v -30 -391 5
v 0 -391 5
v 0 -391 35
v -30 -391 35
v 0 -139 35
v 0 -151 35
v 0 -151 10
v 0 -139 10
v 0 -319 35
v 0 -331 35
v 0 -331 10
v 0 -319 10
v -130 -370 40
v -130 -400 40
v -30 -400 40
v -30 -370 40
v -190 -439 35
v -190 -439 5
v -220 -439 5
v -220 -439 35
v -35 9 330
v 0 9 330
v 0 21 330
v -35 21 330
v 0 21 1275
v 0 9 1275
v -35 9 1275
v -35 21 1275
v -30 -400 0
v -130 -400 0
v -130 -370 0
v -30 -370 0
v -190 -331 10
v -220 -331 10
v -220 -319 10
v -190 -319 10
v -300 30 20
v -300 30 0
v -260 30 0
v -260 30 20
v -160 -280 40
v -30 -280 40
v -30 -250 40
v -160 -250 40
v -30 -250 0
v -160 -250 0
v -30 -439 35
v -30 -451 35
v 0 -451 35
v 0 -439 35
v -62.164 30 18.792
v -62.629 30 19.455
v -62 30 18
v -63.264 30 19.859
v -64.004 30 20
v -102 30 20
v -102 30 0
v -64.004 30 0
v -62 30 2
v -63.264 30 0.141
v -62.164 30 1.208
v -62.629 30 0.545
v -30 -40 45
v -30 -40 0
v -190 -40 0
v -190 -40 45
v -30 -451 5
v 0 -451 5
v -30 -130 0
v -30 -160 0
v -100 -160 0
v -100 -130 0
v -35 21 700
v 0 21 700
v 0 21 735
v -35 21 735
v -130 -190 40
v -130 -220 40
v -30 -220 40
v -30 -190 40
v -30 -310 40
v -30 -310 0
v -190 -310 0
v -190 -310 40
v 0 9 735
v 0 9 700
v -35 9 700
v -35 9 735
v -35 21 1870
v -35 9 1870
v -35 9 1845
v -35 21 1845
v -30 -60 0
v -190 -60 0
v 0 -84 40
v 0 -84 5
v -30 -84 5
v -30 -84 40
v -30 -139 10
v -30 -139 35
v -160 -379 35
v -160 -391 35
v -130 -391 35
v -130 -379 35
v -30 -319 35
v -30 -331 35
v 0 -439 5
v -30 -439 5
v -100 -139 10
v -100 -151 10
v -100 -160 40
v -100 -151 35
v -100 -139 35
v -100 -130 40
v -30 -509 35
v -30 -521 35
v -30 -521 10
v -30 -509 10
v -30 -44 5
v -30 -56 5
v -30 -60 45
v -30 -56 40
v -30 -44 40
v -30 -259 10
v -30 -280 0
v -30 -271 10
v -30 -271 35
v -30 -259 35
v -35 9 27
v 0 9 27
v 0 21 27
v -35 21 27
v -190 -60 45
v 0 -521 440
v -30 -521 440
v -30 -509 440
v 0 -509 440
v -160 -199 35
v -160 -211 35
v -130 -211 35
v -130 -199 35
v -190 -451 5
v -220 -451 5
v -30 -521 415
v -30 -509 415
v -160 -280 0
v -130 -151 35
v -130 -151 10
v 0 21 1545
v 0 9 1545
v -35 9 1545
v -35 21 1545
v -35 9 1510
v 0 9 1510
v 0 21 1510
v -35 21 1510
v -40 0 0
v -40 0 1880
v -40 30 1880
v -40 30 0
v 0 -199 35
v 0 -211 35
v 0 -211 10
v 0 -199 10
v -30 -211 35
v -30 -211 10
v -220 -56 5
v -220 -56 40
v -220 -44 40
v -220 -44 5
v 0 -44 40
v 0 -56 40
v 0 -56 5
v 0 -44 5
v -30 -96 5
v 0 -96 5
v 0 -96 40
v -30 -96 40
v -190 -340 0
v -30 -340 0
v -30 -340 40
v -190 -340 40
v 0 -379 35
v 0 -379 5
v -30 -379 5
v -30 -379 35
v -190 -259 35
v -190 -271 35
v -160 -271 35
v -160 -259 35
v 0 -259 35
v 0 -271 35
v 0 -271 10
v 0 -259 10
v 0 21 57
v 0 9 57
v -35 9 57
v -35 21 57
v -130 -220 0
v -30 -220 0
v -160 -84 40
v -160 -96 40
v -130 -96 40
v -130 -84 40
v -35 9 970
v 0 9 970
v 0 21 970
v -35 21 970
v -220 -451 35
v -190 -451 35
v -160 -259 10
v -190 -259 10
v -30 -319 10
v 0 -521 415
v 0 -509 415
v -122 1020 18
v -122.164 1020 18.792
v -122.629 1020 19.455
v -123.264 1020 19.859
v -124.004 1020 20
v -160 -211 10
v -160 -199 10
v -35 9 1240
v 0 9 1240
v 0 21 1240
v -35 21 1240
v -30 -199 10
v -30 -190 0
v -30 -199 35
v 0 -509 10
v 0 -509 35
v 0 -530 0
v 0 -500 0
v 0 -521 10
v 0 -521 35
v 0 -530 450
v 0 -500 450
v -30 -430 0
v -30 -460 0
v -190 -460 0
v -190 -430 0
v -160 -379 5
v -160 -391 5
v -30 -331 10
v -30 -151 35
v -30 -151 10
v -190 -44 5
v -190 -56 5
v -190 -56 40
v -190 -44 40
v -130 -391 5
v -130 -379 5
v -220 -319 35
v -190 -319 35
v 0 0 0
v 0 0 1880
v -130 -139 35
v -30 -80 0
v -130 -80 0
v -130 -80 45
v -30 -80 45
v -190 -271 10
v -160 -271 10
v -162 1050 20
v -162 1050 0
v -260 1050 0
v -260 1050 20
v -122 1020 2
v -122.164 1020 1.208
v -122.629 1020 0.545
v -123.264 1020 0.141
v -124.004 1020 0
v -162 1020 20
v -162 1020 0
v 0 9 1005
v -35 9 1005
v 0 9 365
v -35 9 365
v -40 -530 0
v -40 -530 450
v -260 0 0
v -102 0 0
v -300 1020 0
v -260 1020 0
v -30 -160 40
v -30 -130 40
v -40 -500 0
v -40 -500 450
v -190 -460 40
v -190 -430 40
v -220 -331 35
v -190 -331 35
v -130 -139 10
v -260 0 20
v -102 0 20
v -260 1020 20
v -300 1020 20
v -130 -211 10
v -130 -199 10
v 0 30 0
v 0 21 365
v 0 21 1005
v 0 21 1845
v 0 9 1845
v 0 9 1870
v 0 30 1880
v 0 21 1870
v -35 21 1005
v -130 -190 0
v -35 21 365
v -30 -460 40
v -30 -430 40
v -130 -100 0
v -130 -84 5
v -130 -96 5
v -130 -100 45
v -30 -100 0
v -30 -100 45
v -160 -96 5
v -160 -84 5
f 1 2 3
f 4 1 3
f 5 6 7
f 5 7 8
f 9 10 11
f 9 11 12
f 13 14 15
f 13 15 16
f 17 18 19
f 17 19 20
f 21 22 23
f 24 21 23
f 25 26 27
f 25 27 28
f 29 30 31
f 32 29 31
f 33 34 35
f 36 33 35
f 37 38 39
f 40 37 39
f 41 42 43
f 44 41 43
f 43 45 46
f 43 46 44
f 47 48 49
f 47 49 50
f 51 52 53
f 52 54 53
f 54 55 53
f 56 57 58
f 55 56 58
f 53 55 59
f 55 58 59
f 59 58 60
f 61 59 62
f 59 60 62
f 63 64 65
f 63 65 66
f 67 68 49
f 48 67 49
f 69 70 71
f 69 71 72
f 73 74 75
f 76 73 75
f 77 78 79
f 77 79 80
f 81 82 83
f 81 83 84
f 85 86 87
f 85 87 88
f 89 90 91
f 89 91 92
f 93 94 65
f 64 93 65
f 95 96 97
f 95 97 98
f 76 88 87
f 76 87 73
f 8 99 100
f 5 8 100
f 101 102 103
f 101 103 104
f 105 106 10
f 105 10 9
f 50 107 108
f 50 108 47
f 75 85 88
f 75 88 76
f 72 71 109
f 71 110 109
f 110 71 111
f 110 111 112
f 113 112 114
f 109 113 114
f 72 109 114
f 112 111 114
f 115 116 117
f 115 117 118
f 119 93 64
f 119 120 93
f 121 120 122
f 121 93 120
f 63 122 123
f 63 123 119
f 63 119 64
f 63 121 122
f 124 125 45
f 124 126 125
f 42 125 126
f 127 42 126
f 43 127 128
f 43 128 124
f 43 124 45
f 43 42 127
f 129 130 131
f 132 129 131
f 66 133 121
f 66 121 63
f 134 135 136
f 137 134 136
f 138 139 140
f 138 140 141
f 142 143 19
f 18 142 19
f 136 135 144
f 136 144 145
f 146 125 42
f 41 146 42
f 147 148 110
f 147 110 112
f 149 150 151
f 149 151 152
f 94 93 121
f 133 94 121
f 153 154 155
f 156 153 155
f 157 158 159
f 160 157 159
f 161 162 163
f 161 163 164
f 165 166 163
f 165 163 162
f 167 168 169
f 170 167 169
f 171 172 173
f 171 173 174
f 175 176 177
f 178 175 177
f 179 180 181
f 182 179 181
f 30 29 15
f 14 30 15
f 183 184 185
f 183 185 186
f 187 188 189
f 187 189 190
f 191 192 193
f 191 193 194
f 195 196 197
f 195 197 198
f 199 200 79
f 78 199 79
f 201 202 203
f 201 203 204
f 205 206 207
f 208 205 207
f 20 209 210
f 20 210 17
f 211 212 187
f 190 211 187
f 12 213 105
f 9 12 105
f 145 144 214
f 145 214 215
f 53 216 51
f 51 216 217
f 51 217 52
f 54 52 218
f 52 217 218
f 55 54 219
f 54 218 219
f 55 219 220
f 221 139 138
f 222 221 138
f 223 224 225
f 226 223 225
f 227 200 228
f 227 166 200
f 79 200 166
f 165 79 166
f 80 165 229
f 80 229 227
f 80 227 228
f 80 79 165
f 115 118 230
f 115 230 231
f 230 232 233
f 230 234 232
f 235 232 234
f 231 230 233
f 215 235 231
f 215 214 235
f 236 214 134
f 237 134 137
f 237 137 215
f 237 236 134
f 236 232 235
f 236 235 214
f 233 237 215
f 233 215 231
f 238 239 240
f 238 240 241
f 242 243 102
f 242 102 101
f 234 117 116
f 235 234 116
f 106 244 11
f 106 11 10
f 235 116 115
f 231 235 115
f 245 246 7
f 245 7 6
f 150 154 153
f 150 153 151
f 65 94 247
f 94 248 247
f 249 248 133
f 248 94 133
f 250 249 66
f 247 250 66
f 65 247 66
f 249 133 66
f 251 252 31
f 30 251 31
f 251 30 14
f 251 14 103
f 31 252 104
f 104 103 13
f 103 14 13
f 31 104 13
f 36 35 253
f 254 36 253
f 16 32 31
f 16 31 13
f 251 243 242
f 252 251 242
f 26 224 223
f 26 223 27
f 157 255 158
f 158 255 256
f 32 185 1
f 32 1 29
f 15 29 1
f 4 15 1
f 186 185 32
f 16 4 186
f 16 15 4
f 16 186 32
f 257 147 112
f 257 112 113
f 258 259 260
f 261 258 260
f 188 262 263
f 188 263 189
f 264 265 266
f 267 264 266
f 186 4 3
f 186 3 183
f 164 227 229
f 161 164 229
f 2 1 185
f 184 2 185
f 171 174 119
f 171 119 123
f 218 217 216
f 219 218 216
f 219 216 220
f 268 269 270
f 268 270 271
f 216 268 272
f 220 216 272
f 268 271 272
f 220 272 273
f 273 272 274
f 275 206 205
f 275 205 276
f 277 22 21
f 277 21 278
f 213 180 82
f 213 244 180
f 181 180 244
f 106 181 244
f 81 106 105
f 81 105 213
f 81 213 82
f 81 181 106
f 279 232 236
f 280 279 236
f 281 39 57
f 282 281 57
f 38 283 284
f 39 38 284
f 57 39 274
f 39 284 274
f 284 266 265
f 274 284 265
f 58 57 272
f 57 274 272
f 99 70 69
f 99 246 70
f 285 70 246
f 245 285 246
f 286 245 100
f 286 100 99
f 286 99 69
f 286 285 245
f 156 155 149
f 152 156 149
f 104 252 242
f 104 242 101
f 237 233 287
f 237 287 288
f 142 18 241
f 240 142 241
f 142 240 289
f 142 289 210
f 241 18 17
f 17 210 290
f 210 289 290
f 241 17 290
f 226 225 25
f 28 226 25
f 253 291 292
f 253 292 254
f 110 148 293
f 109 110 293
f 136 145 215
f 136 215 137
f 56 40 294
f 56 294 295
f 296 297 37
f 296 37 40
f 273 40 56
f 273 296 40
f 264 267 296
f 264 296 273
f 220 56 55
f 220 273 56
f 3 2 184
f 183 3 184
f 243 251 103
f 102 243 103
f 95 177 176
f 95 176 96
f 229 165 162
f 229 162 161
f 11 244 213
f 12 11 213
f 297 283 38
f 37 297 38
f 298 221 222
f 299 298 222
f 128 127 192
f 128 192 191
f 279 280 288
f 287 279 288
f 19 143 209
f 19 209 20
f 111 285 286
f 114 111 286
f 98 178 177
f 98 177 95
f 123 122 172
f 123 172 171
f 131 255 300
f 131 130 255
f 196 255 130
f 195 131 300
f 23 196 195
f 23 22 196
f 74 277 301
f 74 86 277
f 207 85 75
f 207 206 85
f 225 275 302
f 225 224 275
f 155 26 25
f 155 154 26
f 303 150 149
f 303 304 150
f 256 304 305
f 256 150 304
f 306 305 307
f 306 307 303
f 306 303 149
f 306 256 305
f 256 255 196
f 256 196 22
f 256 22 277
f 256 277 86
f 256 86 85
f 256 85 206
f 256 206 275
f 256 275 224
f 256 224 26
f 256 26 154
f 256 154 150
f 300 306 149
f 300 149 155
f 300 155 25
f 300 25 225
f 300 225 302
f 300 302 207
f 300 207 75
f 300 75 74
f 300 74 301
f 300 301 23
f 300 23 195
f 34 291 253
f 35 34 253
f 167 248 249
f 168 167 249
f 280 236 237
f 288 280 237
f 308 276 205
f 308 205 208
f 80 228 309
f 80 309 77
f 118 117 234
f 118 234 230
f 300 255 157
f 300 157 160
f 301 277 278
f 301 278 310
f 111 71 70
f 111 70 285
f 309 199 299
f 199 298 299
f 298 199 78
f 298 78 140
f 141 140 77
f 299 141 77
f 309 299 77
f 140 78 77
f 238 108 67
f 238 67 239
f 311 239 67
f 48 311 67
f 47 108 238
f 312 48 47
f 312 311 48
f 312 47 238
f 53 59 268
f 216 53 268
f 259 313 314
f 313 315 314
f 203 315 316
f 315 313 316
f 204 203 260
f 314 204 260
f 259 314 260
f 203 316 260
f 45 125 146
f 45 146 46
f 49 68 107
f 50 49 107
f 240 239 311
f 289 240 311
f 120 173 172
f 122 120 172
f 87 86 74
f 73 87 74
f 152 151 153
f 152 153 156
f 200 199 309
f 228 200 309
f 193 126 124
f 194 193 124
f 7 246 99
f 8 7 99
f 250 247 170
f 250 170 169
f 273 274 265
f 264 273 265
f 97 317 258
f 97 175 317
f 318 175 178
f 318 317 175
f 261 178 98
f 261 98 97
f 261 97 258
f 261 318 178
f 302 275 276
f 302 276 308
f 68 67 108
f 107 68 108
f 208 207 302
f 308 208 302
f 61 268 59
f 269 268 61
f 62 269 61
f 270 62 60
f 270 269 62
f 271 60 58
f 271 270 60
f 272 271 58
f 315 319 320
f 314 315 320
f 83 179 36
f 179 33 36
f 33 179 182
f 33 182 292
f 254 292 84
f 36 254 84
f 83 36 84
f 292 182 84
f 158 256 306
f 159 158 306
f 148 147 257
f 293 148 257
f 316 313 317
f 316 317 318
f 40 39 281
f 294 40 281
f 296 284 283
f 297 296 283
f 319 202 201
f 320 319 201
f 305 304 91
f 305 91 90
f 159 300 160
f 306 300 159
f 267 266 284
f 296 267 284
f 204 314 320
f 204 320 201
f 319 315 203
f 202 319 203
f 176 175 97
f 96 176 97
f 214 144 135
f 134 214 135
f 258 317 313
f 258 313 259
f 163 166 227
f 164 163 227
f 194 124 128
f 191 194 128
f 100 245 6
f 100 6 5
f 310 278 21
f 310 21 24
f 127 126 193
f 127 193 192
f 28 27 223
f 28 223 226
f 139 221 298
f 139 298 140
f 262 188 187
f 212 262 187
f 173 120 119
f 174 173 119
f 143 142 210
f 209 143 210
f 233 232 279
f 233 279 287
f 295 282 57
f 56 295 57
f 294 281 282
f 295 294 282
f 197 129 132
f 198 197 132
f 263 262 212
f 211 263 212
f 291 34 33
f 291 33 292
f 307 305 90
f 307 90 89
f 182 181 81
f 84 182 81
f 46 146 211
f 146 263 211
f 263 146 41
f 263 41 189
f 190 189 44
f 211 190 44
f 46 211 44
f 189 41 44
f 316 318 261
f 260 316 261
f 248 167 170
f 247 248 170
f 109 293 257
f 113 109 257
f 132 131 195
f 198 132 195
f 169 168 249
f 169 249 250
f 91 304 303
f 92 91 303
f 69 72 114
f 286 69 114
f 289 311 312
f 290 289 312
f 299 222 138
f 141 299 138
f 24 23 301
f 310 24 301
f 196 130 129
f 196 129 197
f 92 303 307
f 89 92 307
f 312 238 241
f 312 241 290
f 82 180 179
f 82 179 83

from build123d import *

# Parameters (mm, degrees)
F1_W      = 12
F1_H      = 35
F2_DEPTH  = 220
F3_START  = -30
F1_W_2    = 20
F1_H_2    = 45
F3_DEPTH  = 160
F4_DEPTH  = 160
F5_START  = -30
F5_DEPTH  = 100
F7_DEPTH  = 20
F8_R      = 2
F0_W      = 30
F0_H      = 1880
F0_W_2    = 12
F0_H_2    = 30
F0_H_3    = 35
F0_H_4    = 25
F9_DEPTH  = 40
F10_DEPTH = 35
F11_W     = 12
F11_H     = 25
F12_DEPTH = 130
F13_START = -30
F11_W_2   = 30
F11_H_2   = 40
F13_DEPTH = 70
F14_DEPTH = 160
F15_START = -30
F15_DEPTH = 100
F16_DEPTH = 190
F17_START = -30
F17_DEPTH = 130
F18_DEPTH = 220
F19_START = -30
F19_DEPTH = 160
F11_H_3   = 30
F20_DEPTH = 160
F21_START = -30
F21_DEPTH = 100
F22_DEPTH = 220
F23_START = -30
F23_DEPTH = 160
F24_W     = 30
F24_H     = 450
F24_W_2   = 12
F24_H_2   = 25
F25_DEPTH = 40
F26_DEPTH = 30


with BuildPart() as f2:
    # F1 (on Right) → F2 (new body)
    with BuildSketch(Plane.YZ):
        with Locations((-50, 22.5)):
            Rectangle(F1_W, F1_H)
    extrude(amount=-F2_DEPTH)

    # F1 (on Right) → F3 (join)
    with BuildSketch(Plane.YZ.offset(F3_START)):
        with Locations((-50, 22.5)):
            Rectangle(F1_W_2, F1_H_2)
        with Locations((-50, 22.5)):
            Rectangle(F1_W, F1_H, mode=Mode.SUBTRACT)
    extrude(amount=-F3_DEPTH)


with BuildPart() as f4:
    # F1 (on Right) → F4 (new body)
    with BuildSketch(Plane.YZ):
        with Locations((-90, 22.5)):
            Rectangle(F1_W, F1_H)
    extrude(amount=-F4_DEPTH)

    # F1 (on Right) → F5 (join)
    with BuildSketch(Plane.YZ.offset(F5_START)):
        with Locations((-90, 22.5)):
            Rectangle(F1_W_2, F1_H_2)
        with Locations((-90, 22.5)):
            Rectangle(F1_W, F1_H, mode=Mode.SUBTRACT)
    extrude(amount=-F5_DEPTH)


with BuildPart() as f7:
    # F6 (on Top) → F7 (new body)
    with BuildSketch(Plane.XY):
        Polygon((-260, 0), (-102, 0), (-102, 30), (-62, 30), (-122, 1020), (-162, 1020), (-162, 1050), (-260, 1050), (-260, 1020), (-300, 1020), (-300, 30), (-260, 30), align=None)
    extrude(amount=F7_DEPTH)

    # F8
    f8_edges = [f7.edges().sort_by_distance(p)[0] for p in [
        (-92, 525, 20),
        (-92, 525, 0),
    ]]
    fillet(f8_edges, radius=F8_R)


with BuildPart() as f9:
    # F0 (on Right) → F9 (new body)
    with BuildSketch(Plane.YZ):
        with Locations((15, 940)):
            Rectangle(F0_W, F0_H)
        with Locations((15, 42)):
            Rectangle(F0_W_2, F0_H_2, mode=Mode.SUBTRACT)
        with Locations((15, 347.5)):
            Rectangle(F0_W_2, F0_H_3, mode=Mode.SUBTRACT)
        with Locations((15, 717.5)):
            Rectangle(F0_W_2, F0_H_3, mode=Mode.SUBTRACT)
        with Locations((15, 987.5)):
            Rectangle(F0_W_2, F0_H_3, mode=Mode.SUBTRACT)
        with Locations((15, 1257.5)):
            Rectangle(F0_W_2, F0_H_3, mode=Mode.SUBTRACT)
        with Locations((15, 1527.5)):
            Rectangle(F0_W_2, F0_H_3, mode=Mode.SUBTRACT)
        with Locations((15, 1857.5)):
            Rectangle(F0_W_2, F0_H_4, mode=Mode.SUBTRACT)
        with Locations((15, 1527.5)):
            Rectangle(F0_W_2, F0_H_3)
        with Locations((15, 1257.5)):
            Rectangle(F0_W_2, F0_H_3)
        with Locations((15, 987.5)):
            Rectangle(F0_W_2, F0_H_3)
        with Locations((15, 717.5)):
            Rectangle(F0_W_2, F0_H_3)
        with Locations((15, 347.5)):
            Rectangle(F0_W_2, F0_H_3)
        with Locations((15, 42)):
            Rectangle(F0_W_2, F0_H_2)
        with Locations((15, 1857.5)):
            Rectangle(F0_W_2, F0_H_4)
    extrude(amount=-F9_DEPTH)

    # F0 (on Right) → F10 (cut)
    with BuildSketch(Plane.YZ):
        with Locations((15, 42)):
            Rectangle(F0_W_2, F0_H_2)
        with Locations((15, 347.5)):
            Rectangle(F0_W_2, F0_H_3)
        with Locations((15, 717.5)):
            Rectangle(F0_W_2, F0_H_3)
        with Locations((15, 987.5)):
            Rectangle(F0_W_2, F0_H_3)
        with Locations((15, 1257.5)):
            Rectangle(F0_W_2, F0_H_3)
        with Locations((15, 1527.5)):
            Rectangle(F0_W_2, F0_H_3)
        with Locations((15, 1857.5)):
            Rectangle(F0_W_2, F0_H_4)
    extrude(amount=-F10_DEPTH, mode=Mode.SUBTRACT)


with BuildPart() as f12:
    # F11 (on Right) → F12 (new body)
    with BuildSketch(Plane.YZ):
        with Locations((-145, 22.5)):
            Rectangle(F11_W, F11_H)
    extrude(amount=-F12_DEPTH)

    # F11 (on Right) → F13 (join)
    with BuildSketch(Plane.YZ.offset(F13_START)):
        with Locations((-145, 20)):
            Rectangle(F11_W_2, F11_H_2)
        with Locations((-145, 22.5)):
            Rectangle(F11_W, F11_H, mode=Mode.SUBTRACT)
    extrude(amount=-F13_DEPTH)


with BuildPart() as f14:
    # F11 (on Right) → F14 (new body)
    with BuildSketch(Plane.YZ):
        with Locations((-205, 22.5)):
            Rectangle(F11_W, F11_H)
    extrude(amount=-F14_DEPTH)

    # F11 (on Right) → F15 (join)
    with BuildSketch(Plane.YZ.offset(F15_START)):
        with Locations((-205, 20)):
            Rectangle(F11_W_2, F11_H_2)
        with Locations((-205, 22.5)):
            Rectangle(F11_W, F11_H, mode=Mode.SUBTRACT)
    extrude(amount=-F15_DEPTH)


with BuildPart() as f16:
    # F11 (on Right) → F16 (new body)
    with BuildSketch(Plane.YZ):
        with Locations((-265, 22.5)):
            Rectangle(F11_W, F11_H)
    extrude(amount=-F16_DEPTH)

    # F11 (on Right) → F17 (join)
    with BuildSketch(Plane.YZ.offset(F17_START)):
        with Locations((-265, 20)):
            Rectangle(F11_W_2, F11_H_2)
        with Locations((-265, 22.5)):
            Rectangle(F11_W, F11_H, mode=Mode.SUBTRACT)
    extrude(amount=-F17_DEPTH)


with BuildPart() as f18:
    # F11 (on Right) → F18 (new body)
    with BuildSketch(Plane.YZ):
        with Locations((-325, 22.5)):
            Rectangle(F11_W, F11_H)
    extrude(amount=-F18_DEPTH)

    # F11 (on Right) → F19 (join)
    with BuildSketch(Plane.YZ.offset(F19_START)):
        with Locations((-325, 20)):
            Rectangle(F11_W_2, F11_H_2)
        with Locations((-325, 22.5)):
            Rectangle(F11_W, F11_H, mode=Mode.SUBTRACT)
    extrude(amount=-F19_DEPTH)


with BuildPart() as f20:
    # F11 (on Right) → F20 (new body)
    with BuildSketch(Plane.YZ):
        with Locations((-385, 20)):
            Rectangle(F11_W, F11_H_3)
    extrude(amount=-F20_DEPTH)

    # F11 (on Right) → F21 (join)
    with BuildSketch(Plane.YZ.offset(F21_START)):
        with Locations((-385, 20)):
            Rectangle(F11_W_2, F11_H_2)
        with Locations((-385, 20)):
            Rectangle(F11_W, F11_H_3, mode=Mode.SUBTRACT)
    extrude(amount=-F21_DEPTH)


with BuildPart() as f22:
    # F11 (on Right) → F22 (new body)
    with BuildSketch(Plane.YZ):
        with Locations((-445, 20)):
            Rectangle(F11_W, F11_H_3)
    extrude(amount=-F22_DEPTH)

    # F11 (on Right) → F23 (join)
    with BuildSketch(Plane.YZ.offset(F23_START)):
        with Locations((-445, 20)):
            Rectangle(F11_W_2, F11_H_2)
        with Locations((-445, 20)):
            Rectangle(F11_W, F11_H_3, mode=Mode.SUBTRACT)
    extrude(amount=-F23_DEPTH)


with BuildPart() as f25:
    # F24 (on Right) → F25 (new body)
    with BuildSketch(Plane.YZ):
        with Locations((-515, 225)):
            Rectangle(F24_W, F24_H)
        with Locations((-515, 22.5)):
            Rectangle(F24_W_2, F24_H_2, mode=Mode.SUBTRACT)
        with Locations((-515, 427.5)):
            Rectangle(F24_W_2, F24_H_2, mode=Mode.SUBTRACT)
        with Locations((-515, 427.5)):
            Rectangle(F24_W_2, F24_H_2)
        with Locations((-515, 22.5)):
            Rectangle(F24_W_2, F24_H_2)
    extrude(amount=-F25_DEPTH)

    # F24 (on Right) → F26 (cut)
    with BuildSketch(Plane.YZ):
        with Locations((-515, 427.5)):
            Rectangle(F24_W_2, F24_H_2)
        with Locations((-515, 22.5)):
            Rectangle(F24_W_2, F24_H_2)
    extrude(amount=-F26_DEPTH, mode=Mode.SUBTRACT)


solid = Compound([f2.part, f4.part, f7.part, f9.part, f12.part, f14.part, f16.part, f18.part, f20.part, f22.part, f25.part])
